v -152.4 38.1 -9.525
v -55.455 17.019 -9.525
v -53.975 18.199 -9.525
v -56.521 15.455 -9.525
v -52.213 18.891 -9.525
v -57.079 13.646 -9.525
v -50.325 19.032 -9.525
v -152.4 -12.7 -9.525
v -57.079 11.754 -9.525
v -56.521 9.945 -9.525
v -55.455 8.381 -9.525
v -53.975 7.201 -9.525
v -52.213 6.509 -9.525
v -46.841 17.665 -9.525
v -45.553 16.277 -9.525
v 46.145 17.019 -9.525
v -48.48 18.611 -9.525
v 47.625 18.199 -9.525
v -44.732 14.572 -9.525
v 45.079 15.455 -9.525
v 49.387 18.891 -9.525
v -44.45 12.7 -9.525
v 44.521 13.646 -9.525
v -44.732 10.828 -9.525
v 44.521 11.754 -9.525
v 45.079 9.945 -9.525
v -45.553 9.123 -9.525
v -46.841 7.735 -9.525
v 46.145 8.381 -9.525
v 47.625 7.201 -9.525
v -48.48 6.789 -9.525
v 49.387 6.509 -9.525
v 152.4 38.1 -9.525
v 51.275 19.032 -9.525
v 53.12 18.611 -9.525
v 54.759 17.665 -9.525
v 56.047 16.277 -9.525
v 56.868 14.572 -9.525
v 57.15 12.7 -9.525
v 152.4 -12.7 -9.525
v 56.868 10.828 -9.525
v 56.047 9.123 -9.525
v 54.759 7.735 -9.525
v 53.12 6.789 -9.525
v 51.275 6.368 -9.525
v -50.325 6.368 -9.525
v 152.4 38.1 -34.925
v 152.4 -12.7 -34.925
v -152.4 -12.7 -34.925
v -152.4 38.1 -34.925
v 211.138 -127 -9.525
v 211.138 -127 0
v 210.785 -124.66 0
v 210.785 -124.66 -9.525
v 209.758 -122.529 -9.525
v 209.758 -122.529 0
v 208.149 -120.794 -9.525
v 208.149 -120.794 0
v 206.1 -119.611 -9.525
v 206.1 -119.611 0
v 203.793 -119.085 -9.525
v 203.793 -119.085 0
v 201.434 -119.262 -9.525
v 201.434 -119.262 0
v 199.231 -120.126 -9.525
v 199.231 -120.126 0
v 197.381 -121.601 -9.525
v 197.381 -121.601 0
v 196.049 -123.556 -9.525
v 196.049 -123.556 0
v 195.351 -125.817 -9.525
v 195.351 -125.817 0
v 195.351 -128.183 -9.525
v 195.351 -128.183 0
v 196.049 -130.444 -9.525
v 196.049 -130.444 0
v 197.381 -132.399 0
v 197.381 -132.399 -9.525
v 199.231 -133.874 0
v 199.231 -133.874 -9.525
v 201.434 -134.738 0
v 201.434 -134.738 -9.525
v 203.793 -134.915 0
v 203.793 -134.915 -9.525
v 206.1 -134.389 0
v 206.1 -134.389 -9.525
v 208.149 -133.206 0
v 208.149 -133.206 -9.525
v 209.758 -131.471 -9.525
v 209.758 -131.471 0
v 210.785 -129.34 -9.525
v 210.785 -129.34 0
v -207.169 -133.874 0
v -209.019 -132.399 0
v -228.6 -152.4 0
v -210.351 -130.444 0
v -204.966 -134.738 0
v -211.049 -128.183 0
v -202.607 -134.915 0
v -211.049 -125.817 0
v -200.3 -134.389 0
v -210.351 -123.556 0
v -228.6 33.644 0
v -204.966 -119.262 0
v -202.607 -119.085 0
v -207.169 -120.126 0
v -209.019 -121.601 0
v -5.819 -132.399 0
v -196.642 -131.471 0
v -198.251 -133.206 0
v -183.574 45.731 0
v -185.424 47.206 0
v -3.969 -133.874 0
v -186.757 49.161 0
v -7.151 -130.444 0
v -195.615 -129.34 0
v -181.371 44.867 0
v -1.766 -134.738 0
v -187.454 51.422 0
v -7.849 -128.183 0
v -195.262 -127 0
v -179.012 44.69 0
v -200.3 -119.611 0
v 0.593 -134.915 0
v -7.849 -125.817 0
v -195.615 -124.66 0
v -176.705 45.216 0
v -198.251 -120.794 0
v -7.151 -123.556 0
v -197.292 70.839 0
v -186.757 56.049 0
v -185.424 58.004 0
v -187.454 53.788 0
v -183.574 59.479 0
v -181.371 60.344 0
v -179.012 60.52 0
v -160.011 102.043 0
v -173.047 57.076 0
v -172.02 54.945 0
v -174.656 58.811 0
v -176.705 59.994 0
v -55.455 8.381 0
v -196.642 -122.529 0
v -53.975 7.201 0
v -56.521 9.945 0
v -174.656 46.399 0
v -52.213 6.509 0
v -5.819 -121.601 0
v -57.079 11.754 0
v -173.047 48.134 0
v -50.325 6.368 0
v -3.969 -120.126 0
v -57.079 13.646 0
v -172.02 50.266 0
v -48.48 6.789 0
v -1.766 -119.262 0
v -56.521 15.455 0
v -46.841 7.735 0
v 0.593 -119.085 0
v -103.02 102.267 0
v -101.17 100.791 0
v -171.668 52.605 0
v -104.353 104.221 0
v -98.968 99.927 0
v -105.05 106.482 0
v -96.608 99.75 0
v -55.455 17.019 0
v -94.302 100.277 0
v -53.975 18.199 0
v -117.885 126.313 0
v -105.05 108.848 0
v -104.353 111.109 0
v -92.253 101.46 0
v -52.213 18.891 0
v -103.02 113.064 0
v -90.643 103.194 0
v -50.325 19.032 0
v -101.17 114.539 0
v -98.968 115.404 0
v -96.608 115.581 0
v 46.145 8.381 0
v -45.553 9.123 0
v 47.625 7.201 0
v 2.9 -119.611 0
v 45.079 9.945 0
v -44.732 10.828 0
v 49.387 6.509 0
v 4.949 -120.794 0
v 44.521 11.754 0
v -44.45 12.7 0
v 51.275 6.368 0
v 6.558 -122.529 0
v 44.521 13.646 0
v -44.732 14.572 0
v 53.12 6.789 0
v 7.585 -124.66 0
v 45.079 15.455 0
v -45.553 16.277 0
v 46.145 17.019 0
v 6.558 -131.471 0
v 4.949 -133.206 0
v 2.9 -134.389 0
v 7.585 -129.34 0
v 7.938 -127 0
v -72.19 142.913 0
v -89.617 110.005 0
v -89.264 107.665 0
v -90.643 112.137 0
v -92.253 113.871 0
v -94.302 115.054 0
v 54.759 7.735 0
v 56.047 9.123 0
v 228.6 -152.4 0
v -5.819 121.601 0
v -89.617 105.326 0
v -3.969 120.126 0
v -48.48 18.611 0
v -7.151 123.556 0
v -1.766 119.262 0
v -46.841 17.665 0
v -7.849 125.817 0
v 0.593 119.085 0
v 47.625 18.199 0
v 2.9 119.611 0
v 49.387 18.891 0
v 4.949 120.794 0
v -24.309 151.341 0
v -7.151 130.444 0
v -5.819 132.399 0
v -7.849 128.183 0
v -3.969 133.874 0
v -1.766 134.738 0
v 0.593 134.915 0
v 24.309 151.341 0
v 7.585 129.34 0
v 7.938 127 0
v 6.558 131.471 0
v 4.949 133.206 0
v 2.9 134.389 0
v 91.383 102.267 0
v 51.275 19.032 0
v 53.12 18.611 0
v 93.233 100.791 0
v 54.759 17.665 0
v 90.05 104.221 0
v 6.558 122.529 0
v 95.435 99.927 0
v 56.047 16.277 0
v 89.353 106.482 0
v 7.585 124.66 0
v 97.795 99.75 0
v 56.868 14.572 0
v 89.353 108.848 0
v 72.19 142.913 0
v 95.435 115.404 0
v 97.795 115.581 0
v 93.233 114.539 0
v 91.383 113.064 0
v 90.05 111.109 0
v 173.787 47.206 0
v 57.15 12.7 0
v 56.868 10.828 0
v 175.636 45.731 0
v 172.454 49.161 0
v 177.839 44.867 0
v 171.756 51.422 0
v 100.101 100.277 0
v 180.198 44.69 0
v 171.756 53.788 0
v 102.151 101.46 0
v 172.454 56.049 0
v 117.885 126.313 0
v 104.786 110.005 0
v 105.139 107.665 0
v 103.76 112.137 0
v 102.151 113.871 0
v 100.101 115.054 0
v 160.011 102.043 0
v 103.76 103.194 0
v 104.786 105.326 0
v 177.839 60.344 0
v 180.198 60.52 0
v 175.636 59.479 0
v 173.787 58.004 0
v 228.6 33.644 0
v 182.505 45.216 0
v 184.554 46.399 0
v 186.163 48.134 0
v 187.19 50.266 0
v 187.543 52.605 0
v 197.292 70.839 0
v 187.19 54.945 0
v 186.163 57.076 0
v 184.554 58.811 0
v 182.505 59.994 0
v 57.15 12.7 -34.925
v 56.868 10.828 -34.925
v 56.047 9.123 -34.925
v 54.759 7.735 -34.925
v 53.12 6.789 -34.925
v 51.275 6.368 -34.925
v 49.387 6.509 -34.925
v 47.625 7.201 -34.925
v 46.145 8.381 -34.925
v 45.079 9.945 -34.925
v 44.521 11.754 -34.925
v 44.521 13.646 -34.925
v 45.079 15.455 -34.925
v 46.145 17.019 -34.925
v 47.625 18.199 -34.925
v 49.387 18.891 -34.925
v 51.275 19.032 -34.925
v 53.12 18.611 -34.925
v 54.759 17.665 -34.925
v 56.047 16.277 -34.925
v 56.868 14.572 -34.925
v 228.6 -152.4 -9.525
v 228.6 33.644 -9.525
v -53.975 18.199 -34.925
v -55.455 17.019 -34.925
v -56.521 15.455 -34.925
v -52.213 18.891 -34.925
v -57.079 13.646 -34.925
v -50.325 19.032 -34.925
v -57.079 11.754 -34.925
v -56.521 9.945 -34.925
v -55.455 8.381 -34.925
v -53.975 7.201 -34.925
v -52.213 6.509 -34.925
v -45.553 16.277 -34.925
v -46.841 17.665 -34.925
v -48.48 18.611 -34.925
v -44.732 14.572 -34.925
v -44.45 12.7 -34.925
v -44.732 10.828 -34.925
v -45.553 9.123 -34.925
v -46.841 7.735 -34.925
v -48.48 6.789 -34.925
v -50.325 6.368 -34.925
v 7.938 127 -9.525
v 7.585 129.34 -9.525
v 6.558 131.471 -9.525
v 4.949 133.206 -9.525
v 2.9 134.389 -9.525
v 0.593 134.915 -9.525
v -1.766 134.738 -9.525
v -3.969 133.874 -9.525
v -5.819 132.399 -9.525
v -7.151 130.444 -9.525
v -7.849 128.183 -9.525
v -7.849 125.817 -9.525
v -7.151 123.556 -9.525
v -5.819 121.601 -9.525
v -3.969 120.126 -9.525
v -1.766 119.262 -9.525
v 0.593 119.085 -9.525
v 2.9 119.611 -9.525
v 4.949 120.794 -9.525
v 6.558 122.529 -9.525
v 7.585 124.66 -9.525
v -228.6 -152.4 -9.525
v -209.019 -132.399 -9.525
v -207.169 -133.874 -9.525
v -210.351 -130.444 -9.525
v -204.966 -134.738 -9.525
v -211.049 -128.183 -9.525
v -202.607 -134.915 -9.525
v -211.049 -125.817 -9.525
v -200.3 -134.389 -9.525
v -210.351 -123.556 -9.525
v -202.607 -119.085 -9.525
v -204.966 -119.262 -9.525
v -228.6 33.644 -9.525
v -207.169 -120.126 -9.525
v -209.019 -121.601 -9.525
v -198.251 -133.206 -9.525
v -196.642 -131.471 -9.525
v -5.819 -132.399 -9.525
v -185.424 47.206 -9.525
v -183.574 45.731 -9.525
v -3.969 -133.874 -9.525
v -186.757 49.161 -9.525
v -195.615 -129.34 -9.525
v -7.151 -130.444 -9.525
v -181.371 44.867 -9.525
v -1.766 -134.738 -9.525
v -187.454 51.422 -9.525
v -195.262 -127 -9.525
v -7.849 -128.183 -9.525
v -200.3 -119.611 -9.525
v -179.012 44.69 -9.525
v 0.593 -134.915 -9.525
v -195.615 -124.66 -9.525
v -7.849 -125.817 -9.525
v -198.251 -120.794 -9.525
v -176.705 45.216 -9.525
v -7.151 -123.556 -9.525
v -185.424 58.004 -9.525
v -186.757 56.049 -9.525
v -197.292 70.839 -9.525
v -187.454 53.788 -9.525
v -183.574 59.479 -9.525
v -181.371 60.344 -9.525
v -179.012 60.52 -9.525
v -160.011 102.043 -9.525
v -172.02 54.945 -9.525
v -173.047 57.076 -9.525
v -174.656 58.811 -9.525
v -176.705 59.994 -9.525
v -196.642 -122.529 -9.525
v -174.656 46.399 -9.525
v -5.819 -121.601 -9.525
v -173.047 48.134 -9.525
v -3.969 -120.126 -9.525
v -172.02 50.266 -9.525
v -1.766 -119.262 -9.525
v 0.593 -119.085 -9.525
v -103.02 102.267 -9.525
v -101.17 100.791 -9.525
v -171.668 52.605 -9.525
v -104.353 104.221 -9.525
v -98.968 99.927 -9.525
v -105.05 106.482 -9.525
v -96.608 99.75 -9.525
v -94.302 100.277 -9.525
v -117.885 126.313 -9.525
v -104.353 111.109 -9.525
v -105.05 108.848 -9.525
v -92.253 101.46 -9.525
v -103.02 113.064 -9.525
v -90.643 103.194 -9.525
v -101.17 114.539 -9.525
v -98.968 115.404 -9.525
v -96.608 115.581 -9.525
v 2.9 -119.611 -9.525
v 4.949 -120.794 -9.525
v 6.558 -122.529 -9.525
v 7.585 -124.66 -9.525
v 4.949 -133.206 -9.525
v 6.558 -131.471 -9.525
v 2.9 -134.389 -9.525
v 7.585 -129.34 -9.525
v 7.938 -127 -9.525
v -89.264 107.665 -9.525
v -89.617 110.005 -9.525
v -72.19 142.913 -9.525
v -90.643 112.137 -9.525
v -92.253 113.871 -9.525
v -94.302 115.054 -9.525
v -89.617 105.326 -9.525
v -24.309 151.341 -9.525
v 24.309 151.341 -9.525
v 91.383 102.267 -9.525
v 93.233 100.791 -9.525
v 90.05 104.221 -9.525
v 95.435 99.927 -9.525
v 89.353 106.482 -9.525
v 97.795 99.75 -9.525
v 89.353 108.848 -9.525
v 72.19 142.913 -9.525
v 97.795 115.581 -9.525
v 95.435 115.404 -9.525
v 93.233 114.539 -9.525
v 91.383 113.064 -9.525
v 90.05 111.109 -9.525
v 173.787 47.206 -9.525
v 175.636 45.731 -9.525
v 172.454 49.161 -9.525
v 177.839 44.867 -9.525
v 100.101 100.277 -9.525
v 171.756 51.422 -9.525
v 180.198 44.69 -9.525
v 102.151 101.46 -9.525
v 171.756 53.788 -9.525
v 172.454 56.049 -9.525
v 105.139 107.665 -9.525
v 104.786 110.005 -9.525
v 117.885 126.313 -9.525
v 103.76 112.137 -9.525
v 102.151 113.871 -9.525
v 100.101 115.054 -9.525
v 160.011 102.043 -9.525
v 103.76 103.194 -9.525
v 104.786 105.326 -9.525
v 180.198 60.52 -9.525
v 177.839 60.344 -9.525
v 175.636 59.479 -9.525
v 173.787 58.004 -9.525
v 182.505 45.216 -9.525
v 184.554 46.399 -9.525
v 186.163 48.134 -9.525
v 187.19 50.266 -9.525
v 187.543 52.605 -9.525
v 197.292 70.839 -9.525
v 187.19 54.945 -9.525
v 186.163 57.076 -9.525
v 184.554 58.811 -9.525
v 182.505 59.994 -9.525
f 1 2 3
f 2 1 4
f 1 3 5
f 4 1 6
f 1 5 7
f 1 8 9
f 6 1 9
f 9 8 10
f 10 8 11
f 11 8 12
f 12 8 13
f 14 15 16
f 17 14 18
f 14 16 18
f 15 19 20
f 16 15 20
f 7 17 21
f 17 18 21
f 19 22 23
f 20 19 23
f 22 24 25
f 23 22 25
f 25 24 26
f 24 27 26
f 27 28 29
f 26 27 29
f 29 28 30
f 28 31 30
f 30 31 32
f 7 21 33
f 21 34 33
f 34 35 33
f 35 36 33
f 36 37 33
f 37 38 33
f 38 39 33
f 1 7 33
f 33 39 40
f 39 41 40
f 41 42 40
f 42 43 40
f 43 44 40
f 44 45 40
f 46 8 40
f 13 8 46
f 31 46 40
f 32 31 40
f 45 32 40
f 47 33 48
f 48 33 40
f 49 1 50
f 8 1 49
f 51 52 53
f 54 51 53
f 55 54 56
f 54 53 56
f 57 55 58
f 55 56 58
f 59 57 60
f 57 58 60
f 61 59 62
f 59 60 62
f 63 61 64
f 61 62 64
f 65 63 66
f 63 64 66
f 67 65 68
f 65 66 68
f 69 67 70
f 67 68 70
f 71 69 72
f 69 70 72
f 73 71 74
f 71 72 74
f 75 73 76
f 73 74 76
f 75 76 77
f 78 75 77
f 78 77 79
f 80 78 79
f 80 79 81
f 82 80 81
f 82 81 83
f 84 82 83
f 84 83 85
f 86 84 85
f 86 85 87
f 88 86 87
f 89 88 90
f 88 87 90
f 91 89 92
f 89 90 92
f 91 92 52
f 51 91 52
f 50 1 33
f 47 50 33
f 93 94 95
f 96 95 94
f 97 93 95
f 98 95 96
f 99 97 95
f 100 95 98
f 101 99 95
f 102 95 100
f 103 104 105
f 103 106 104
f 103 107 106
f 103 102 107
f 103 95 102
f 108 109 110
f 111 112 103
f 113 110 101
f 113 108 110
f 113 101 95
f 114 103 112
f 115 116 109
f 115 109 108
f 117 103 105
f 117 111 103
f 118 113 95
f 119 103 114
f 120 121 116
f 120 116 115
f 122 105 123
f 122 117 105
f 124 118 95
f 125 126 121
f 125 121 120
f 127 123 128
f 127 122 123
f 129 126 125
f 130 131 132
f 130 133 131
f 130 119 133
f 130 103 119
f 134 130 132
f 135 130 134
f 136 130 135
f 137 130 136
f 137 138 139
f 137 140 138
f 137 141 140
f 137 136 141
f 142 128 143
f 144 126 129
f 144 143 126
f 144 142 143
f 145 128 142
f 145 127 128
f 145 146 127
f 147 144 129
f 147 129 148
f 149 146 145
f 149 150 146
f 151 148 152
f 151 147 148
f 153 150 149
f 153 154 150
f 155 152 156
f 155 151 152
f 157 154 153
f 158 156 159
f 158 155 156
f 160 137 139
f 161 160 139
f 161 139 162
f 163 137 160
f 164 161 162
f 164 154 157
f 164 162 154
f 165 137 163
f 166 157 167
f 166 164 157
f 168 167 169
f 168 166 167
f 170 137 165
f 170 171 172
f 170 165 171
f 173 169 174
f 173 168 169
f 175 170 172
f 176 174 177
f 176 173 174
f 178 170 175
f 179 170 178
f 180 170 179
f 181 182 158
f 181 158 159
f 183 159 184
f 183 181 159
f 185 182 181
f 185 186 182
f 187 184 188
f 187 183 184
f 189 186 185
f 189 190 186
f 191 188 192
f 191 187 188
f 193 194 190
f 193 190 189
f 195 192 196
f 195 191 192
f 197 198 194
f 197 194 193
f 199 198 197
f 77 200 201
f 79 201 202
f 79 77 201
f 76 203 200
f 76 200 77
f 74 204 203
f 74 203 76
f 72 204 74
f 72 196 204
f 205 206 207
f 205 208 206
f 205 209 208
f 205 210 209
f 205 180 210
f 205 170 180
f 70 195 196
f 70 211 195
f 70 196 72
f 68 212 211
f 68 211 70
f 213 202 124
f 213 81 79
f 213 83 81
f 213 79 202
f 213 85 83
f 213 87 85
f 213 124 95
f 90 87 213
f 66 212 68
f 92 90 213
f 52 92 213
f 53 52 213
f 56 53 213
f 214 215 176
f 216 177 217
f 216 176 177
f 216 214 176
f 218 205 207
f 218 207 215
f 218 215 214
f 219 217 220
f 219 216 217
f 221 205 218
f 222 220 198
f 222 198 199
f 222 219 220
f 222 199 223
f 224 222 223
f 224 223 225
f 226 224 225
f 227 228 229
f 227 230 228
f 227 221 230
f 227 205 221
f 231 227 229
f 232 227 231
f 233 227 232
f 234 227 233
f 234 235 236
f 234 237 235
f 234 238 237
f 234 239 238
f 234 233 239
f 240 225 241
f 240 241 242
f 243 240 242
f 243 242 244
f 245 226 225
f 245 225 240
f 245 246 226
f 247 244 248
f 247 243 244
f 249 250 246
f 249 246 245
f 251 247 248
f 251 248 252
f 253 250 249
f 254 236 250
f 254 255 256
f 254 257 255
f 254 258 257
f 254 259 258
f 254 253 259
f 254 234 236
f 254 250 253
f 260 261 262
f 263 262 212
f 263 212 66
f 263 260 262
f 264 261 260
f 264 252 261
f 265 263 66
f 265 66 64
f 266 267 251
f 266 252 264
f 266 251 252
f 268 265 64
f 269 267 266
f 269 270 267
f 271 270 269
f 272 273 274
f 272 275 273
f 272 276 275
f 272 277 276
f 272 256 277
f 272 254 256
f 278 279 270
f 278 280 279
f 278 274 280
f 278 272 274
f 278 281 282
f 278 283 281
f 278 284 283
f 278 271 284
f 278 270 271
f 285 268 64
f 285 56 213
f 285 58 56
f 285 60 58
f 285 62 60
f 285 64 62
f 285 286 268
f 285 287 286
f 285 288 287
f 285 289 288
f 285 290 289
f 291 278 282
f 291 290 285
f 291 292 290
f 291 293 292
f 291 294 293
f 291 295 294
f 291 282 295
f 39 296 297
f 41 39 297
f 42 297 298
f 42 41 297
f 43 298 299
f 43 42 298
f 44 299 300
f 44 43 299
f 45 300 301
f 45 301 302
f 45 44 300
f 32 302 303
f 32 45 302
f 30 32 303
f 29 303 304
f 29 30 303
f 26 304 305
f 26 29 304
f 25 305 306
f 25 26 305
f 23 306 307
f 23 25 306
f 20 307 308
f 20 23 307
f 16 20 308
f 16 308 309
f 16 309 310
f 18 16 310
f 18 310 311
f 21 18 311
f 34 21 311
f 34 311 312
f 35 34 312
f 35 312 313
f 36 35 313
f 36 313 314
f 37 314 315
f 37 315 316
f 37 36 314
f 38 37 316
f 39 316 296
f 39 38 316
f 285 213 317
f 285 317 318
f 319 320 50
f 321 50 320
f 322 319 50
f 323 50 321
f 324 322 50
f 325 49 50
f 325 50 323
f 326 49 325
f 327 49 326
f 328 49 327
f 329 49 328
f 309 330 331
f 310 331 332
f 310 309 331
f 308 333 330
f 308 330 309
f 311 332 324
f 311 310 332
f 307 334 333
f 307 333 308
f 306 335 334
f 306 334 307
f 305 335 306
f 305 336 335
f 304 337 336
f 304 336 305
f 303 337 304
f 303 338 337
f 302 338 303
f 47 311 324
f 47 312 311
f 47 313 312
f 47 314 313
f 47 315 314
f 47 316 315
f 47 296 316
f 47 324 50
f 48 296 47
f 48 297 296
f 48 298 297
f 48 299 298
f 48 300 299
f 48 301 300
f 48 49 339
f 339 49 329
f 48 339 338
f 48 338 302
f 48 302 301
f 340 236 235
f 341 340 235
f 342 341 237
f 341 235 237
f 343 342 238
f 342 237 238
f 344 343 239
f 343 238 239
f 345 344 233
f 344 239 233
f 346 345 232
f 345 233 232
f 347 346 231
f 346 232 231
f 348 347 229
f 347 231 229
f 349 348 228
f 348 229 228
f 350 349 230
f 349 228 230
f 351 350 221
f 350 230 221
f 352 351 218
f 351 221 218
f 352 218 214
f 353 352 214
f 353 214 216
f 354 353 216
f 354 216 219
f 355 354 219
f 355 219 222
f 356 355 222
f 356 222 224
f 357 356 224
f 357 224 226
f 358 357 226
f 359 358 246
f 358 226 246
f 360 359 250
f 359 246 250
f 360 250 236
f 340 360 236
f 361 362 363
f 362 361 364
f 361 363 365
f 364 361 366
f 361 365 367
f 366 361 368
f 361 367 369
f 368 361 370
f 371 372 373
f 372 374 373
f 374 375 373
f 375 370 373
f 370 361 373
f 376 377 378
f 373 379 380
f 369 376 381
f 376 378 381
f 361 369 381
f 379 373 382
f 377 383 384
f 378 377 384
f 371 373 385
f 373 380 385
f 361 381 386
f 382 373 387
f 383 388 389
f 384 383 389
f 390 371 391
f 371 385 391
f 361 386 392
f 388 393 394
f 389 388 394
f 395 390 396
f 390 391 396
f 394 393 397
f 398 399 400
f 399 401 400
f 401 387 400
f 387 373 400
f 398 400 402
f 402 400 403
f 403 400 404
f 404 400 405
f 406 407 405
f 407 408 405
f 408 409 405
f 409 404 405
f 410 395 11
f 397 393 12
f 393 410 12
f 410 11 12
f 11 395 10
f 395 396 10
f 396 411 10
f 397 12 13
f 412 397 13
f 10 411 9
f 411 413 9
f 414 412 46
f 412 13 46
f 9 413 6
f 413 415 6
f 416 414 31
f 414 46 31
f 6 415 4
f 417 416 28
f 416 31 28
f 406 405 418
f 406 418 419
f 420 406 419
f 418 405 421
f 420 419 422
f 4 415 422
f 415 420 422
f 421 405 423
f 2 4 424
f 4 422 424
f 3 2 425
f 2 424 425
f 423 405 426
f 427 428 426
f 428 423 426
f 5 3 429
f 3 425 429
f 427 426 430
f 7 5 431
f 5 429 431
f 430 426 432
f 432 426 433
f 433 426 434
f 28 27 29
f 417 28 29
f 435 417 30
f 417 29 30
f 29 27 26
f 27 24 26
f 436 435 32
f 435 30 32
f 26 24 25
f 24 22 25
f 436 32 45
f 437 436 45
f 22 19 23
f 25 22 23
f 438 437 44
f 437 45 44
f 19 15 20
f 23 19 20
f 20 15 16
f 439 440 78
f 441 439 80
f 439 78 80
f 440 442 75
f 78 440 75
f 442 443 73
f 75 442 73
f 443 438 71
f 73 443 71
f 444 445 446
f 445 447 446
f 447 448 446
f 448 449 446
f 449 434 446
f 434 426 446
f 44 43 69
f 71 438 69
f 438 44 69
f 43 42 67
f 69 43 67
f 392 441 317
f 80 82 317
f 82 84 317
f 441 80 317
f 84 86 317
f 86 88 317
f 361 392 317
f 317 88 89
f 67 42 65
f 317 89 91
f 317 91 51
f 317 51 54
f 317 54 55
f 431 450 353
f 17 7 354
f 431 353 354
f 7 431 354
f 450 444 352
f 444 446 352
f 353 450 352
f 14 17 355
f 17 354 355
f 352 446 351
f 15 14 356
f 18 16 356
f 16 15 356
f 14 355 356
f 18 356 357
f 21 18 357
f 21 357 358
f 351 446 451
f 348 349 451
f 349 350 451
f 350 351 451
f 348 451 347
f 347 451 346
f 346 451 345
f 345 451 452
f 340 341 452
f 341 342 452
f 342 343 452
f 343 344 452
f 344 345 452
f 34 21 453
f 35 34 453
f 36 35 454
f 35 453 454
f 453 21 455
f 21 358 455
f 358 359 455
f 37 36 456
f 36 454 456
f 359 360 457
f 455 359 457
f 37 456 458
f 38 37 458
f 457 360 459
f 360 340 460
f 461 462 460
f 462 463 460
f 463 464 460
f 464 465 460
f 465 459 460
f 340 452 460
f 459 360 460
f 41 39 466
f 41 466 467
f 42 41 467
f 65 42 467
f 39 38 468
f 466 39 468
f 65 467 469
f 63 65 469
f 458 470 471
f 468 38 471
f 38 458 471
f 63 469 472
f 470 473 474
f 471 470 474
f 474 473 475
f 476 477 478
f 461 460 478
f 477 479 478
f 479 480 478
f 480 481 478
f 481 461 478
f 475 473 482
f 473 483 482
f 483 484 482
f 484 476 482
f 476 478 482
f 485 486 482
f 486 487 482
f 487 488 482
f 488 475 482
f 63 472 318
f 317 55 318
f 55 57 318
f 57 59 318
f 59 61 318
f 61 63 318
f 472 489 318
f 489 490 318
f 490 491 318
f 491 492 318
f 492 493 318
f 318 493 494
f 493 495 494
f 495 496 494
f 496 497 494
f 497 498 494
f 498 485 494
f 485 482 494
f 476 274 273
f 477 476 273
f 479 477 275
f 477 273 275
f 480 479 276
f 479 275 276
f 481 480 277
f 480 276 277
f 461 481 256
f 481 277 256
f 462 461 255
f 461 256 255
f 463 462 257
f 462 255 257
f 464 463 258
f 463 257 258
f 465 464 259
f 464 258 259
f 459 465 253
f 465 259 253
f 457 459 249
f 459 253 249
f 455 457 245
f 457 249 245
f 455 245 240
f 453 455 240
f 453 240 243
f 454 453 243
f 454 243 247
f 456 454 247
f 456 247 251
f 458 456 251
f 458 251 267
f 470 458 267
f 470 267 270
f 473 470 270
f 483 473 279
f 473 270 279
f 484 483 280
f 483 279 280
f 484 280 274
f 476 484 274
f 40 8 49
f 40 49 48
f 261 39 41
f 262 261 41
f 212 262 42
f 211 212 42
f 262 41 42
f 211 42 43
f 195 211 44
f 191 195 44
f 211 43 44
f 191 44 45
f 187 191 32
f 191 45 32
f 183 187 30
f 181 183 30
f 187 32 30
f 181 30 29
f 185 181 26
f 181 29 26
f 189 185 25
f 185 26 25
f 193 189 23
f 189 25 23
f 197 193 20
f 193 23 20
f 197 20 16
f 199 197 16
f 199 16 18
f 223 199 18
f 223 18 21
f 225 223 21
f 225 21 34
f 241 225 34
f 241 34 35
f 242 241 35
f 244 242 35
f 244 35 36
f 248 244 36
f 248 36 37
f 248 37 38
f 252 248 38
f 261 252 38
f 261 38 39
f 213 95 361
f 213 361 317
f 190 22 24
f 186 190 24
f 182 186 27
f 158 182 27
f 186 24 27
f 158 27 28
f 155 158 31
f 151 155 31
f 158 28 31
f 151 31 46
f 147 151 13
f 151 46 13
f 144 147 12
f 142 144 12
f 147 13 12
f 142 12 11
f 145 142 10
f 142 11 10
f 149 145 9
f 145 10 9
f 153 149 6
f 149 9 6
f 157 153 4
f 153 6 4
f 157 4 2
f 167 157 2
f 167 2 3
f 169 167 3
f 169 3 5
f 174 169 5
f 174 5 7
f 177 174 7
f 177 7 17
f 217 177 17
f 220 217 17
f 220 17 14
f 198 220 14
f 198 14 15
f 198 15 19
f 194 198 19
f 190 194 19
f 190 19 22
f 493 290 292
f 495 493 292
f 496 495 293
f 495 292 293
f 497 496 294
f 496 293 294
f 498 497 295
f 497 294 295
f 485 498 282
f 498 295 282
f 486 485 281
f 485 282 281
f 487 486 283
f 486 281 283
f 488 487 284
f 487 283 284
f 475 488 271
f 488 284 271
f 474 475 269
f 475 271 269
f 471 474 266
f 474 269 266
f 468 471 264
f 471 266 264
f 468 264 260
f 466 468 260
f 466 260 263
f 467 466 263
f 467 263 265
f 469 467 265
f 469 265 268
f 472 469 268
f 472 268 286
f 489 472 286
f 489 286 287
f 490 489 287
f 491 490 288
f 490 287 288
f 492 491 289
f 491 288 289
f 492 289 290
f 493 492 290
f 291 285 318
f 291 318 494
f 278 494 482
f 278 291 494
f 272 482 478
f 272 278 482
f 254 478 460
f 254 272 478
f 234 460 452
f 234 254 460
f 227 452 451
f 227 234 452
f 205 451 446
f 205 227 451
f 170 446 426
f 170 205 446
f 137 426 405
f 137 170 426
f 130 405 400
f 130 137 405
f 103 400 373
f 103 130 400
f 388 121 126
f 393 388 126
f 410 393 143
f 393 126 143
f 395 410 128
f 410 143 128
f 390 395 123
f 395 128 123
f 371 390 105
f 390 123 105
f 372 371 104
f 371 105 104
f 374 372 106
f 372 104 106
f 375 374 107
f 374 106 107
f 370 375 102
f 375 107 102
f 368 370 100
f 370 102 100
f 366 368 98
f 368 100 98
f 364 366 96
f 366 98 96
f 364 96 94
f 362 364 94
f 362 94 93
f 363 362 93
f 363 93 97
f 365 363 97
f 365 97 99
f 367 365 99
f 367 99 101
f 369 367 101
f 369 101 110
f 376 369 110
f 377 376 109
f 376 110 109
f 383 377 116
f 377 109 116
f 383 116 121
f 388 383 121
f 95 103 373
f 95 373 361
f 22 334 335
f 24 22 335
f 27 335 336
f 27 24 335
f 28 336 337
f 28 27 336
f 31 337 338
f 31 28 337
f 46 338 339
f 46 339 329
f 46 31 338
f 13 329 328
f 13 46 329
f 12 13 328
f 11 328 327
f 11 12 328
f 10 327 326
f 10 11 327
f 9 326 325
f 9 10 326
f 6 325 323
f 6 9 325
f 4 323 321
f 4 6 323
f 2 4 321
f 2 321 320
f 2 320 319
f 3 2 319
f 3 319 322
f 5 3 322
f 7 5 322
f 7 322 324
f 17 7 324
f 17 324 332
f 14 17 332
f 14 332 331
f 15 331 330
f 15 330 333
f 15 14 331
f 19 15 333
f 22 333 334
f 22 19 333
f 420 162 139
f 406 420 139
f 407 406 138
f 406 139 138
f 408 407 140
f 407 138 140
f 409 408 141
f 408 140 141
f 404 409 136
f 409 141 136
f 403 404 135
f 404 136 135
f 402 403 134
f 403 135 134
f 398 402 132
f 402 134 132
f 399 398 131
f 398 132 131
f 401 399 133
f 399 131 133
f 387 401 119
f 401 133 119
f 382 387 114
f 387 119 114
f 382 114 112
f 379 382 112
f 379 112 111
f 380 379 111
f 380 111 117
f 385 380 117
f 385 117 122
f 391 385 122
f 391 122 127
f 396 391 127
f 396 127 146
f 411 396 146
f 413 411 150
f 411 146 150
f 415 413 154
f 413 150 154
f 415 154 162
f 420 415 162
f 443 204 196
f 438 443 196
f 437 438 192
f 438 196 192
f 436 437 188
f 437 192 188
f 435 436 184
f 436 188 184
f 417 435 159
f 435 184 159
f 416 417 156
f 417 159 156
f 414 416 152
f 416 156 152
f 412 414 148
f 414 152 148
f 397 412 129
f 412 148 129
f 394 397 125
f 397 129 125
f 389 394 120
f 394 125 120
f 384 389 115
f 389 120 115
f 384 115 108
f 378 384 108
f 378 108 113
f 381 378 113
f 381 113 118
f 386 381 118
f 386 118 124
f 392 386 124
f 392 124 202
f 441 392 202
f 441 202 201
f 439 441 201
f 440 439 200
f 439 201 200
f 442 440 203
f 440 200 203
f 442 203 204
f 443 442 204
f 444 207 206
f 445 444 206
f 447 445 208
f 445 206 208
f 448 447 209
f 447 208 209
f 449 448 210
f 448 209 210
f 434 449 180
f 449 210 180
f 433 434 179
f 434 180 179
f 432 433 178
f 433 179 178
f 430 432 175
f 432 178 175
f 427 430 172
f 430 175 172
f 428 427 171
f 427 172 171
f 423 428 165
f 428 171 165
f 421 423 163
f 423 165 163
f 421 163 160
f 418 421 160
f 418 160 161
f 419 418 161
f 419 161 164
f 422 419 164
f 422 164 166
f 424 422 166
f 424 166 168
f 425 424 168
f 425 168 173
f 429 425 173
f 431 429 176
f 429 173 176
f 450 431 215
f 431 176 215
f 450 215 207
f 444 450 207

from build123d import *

# Parameters (mm, degrees)
F0_R     = 7.9375
F1_DEPTH = 9.525
F2_W     = 304.8
F2_H     = 50.8
F2_R     = 6.35
F3_DEPTH = 25.4
F4_DEPTH = 9.526


# Not quite as in the source:
# - a feature names something its author has since deleted; it is built from what else it names


with BuildPart() as f1:
    # F0 (on Top) → F1 (new body)
    with BuildSketch(Plane.XY):
        with BuildLine():
            Line((-228.6, 33.6437051366), (-228.6, -152.4))
            Line((-228.6, -152.4), (228.6, -152.4))
            Line((228.6, -152.4), (228.6, 33.6437051366))
            ThreePointArc((228.6, 33.6437051366), (0, 152.4), (-228.6, 33.6437051366))
        make_face()
        with Locations((-203.2, -127)):
            Circle(F0_R, mode=Mode.SUBTRACT)
        with Locations((0, -127)):
            Circle(F0_R, mode=Mode.SUBTRACT)
        with Locations((203.2, -127)):
            Circle(F0_R, mode=Mode.SUBTRACT)
        with Locations((-179.6051224214, 52.6051224214)):
            Circle(F0_R, mode=Mode.SUBTRACT)
        with Locations((-97.2015918207, 107.6654012579)):
            Circle(F0_R, mode=Mode.SUBTRACT)
        with Locations((179.6051224214, 52.6051224214)):
            Circle(F0_R, mode=Mode.SUBTRACT)
        with Locations((97.2015918207, 107.6654012579)):
            Circle(F0_R, mode=Mode.SUBTRACT)
        with Locations((0, 127)):
            Circle(F0_R, mode=Mode.SUBTRACT)
    extrude(amount=-F1_DEPTH)

    # F2 (on face) → F4 (cut, through all)
    with BuildSketch(Plane(origin=(0, 0, -9.525), x_dir=(1, 0, 0), z_dir=(0, 0, -1))):
        with Locations((-50.8, -12.7)):
            Circle(F2_R)
        with Locations((50.8, -12.7)):
            Circle(F2_R)
    extrude(amount=-F4_DEPTH, mode=Mode.SUBTRACT)


with BuildPart() as f3:
    # F2 (on face) → F3 (new body)
    with BuildSketch(Plane(origin=(0, 0, -9.525), x_dir=(1, 0, 0), z_dir=(0, 0, -1))):
        with Locations((0, -12.7)):
            Rectangle(F2_W, F2_H)
        with Locations((-50.8, -12.7)):
            Circle(F2_R, mode=Mode.SUBTRACT)
        with Locations((50.8, -12.7)):
            Circle(F2_R, mode=Mode.SUBTRACT)
    extrude(amount=F3_DEPTH)


solid = Compound([f1.part, f3.part])
